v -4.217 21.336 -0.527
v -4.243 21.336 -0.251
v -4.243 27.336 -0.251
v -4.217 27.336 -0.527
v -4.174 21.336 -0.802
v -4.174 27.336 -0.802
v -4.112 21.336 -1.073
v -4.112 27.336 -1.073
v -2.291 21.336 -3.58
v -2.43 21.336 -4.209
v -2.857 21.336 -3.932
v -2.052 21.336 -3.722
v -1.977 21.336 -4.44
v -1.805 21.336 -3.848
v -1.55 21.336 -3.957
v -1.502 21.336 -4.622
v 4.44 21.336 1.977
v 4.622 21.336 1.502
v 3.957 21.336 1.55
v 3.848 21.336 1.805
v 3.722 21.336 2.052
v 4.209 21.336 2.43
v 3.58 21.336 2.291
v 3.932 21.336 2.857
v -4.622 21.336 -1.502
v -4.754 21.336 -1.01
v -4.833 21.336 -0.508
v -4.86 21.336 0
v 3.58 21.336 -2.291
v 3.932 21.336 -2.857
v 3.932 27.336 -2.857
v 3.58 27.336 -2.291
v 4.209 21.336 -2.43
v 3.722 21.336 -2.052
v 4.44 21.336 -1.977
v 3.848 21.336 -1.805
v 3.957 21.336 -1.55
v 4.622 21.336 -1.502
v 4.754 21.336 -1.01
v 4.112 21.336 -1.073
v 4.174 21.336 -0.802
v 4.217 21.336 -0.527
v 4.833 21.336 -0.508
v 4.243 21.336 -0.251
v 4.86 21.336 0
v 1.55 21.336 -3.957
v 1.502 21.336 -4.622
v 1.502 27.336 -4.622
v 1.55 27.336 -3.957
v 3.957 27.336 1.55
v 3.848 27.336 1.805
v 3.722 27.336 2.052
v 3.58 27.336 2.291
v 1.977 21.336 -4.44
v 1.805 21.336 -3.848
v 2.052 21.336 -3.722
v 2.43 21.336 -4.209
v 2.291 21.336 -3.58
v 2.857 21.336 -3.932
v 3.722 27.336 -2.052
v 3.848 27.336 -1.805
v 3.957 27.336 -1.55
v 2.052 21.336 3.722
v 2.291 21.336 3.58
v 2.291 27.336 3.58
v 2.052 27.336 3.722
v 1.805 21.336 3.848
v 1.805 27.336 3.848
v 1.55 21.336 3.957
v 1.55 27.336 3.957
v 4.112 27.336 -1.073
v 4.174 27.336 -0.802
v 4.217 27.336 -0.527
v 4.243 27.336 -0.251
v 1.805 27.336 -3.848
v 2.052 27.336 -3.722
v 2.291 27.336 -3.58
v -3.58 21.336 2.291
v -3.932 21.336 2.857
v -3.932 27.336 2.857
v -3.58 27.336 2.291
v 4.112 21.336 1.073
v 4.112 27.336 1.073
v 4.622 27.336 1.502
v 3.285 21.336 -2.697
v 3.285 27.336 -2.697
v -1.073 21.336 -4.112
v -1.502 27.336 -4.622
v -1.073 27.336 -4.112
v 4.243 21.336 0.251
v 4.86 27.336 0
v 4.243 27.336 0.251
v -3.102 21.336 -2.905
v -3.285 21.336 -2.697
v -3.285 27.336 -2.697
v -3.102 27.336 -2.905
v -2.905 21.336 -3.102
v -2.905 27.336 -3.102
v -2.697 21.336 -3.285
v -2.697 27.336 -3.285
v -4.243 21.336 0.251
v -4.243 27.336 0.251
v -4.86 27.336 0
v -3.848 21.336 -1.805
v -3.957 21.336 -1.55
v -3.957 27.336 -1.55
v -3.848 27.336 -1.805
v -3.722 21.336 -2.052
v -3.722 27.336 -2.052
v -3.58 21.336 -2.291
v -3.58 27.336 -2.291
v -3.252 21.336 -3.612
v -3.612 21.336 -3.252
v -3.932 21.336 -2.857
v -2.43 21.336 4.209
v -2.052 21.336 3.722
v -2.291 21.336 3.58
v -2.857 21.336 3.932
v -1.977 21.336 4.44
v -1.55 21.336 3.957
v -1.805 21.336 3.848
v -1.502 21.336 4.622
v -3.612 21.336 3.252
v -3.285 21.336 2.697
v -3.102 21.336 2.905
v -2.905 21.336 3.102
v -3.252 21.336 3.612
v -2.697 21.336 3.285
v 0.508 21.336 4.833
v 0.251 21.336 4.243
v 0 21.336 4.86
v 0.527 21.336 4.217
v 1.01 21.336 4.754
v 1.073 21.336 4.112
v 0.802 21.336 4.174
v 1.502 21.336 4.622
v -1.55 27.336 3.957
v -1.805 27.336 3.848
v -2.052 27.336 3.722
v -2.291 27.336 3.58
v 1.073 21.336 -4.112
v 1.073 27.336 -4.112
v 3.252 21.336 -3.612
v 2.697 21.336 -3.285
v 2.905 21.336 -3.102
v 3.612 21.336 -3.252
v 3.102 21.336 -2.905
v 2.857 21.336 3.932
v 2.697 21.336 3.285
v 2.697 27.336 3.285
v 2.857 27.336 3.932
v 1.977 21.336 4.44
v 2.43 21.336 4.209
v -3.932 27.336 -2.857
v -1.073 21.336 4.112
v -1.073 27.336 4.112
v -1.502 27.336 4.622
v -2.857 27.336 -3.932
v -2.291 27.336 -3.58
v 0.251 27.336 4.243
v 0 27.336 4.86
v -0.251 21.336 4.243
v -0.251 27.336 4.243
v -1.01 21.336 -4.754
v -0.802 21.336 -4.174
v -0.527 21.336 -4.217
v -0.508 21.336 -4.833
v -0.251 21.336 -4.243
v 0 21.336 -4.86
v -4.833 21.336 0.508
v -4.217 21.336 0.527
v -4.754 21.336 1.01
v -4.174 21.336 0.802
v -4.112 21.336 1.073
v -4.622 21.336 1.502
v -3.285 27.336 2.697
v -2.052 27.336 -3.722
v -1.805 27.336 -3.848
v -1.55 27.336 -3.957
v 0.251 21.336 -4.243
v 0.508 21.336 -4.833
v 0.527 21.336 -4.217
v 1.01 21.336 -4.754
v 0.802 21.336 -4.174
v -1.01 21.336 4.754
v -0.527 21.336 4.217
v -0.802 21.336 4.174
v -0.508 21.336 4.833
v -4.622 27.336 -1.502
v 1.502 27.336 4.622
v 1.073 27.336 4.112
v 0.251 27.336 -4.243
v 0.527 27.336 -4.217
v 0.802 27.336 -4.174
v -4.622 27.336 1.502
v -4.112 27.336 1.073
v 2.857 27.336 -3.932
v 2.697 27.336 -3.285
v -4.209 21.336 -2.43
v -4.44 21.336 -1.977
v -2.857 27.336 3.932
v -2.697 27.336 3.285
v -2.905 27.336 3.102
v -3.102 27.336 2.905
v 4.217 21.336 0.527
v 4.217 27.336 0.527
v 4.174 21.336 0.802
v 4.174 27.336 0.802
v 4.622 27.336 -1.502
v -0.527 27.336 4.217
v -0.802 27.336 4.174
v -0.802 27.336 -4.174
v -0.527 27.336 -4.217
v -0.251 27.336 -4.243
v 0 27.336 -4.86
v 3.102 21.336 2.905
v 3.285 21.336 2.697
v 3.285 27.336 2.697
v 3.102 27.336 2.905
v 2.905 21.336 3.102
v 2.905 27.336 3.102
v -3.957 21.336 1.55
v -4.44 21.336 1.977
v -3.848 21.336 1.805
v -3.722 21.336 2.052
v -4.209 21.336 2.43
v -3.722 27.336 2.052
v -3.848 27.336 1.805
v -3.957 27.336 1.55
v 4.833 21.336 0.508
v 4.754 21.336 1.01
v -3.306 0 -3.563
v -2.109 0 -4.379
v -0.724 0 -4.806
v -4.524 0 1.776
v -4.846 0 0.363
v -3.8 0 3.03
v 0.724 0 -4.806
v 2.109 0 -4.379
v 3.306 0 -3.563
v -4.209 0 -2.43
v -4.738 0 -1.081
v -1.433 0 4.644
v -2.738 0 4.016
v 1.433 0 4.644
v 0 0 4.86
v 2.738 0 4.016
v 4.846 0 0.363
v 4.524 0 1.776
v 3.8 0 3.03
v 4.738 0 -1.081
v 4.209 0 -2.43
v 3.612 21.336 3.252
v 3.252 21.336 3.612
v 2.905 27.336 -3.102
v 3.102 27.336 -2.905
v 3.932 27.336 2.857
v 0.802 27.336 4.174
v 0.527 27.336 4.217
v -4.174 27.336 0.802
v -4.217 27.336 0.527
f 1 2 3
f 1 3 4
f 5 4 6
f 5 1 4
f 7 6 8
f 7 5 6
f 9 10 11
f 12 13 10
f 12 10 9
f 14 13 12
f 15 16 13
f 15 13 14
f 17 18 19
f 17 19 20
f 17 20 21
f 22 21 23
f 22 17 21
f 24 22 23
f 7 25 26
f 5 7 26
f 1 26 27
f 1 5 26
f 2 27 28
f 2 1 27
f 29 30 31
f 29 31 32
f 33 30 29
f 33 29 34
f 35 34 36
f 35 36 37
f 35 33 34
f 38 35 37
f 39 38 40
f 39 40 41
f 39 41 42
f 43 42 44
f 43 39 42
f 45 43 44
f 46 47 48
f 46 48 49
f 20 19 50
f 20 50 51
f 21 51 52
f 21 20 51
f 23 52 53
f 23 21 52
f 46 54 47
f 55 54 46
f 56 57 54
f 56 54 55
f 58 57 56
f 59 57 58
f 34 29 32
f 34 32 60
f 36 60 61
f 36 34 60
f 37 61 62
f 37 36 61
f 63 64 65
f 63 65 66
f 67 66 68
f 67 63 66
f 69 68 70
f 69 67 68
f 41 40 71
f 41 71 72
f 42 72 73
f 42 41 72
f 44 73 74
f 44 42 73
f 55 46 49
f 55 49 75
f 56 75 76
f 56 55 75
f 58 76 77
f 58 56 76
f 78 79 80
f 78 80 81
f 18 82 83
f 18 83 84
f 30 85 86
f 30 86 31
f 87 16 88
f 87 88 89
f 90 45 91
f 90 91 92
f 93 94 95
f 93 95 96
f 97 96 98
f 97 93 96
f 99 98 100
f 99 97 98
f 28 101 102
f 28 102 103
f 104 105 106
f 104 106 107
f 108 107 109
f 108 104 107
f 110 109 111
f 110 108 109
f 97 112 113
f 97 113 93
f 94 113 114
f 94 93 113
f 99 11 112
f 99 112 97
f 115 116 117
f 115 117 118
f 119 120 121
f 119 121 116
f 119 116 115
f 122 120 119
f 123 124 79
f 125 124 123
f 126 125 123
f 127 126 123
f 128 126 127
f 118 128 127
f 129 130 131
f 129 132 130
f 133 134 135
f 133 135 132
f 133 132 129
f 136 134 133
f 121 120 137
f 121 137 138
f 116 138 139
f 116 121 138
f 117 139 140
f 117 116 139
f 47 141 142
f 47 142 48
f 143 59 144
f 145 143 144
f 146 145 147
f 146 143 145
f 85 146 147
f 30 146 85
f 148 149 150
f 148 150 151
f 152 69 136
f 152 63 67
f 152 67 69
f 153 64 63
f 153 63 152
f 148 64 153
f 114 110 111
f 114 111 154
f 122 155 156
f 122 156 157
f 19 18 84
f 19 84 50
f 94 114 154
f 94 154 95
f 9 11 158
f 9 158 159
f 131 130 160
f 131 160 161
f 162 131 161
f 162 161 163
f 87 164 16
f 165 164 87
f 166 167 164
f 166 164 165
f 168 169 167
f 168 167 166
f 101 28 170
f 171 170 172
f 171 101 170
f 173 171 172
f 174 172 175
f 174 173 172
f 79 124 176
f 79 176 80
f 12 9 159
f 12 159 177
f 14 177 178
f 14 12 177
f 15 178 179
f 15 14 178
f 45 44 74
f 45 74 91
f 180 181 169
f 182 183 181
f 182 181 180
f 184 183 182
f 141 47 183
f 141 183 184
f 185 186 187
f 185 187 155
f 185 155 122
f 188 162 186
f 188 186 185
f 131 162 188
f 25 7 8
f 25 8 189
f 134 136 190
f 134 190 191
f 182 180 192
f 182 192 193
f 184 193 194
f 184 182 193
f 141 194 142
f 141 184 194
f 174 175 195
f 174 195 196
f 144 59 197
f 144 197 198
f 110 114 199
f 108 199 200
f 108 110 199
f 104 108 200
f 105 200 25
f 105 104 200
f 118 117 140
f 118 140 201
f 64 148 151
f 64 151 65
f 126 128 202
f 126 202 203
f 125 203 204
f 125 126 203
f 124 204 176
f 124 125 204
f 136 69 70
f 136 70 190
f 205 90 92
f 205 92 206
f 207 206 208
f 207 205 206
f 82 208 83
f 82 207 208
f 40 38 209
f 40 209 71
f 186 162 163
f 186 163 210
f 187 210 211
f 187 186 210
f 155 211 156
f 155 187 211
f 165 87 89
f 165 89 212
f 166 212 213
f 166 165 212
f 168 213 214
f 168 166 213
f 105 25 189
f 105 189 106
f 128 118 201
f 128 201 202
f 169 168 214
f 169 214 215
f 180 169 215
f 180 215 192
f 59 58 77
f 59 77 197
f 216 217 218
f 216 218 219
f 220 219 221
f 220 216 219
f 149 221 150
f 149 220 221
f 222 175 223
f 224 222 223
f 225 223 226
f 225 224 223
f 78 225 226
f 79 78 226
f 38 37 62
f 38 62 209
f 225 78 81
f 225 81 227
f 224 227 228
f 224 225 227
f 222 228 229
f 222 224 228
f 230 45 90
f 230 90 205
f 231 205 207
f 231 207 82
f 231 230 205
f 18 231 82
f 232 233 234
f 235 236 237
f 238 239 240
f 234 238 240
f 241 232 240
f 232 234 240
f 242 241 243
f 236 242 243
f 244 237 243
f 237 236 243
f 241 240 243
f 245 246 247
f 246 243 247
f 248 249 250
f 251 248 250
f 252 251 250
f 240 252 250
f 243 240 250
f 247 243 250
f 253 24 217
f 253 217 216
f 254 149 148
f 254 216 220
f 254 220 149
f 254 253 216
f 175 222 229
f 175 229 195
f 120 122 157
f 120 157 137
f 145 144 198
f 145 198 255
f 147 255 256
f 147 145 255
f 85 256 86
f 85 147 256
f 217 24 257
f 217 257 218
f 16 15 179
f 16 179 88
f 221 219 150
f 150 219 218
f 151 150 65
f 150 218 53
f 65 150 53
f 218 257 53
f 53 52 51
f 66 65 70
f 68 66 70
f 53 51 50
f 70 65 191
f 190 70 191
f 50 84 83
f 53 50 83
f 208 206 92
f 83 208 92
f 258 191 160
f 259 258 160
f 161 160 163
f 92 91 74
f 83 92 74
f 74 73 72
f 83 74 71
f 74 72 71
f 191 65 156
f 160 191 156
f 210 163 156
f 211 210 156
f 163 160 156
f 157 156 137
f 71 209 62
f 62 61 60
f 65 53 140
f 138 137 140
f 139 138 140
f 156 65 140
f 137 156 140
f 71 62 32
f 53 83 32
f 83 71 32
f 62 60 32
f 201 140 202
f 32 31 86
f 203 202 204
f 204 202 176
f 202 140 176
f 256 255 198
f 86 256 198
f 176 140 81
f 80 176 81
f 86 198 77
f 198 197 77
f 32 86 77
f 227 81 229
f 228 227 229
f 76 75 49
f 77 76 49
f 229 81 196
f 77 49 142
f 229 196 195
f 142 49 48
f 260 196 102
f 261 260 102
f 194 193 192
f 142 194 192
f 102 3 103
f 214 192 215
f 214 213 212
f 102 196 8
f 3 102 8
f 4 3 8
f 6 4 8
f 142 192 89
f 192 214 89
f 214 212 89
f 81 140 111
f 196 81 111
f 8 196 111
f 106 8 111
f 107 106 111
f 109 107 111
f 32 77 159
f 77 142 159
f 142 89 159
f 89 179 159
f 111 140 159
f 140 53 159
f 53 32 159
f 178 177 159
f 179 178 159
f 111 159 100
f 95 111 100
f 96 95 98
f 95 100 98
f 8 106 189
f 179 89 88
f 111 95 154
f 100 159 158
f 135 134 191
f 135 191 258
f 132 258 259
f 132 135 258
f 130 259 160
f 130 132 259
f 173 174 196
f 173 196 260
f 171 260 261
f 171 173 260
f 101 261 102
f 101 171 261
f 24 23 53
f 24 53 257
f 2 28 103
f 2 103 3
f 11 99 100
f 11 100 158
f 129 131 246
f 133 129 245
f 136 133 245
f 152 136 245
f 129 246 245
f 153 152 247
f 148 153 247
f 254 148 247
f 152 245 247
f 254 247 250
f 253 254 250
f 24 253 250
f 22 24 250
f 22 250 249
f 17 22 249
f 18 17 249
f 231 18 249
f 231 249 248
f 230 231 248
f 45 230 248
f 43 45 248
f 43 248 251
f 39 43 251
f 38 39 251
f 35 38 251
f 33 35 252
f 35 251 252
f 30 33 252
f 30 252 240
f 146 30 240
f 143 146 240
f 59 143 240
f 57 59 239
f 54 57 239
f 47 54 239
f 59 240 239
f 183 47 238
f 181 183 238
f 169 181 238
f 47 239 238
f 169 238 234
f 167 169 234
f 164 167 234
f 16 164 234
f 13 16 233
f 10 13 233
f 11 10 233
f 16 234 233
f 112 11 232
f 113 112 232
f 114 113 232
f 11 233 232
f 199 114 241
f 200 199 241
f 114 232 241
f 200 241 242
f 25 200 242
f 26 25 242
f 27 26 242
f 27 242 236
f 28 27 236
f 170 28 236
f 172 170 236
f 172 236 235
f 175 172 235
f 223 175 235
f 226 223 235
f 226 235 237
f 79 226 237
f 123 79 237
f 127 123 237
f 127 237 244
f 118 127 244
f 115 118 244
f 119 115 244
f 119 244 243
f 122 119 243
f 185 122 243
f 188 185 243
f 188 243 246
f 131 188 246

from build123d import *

# Parameters (mm, degrees)
SKETCH1_R           = 4.86
BOSS_EXTRUDE1_DEPTH = 21.336
BOSS_EXTRUDE2_DEPTH = 6


with BuildPart() as part:
    # Sketch1 → Boss-Extrude1 (new body)
    with BuildSketch(Plane(origin=(0, 0, 0), x_dir=(1, 0, 0), z_dir=(0, 1, 0))):
        with Locations(Location((0, 0, 0), (0, 0, 270))):
            Circle(SKETCH1_R)
    extrude(amount=BOSS_EXTRUDE1_DEPTH)

    # Sketch2 → Boss-Extrude2 (add)
    with BuildSketch(Plane(origin=(0, 21.336, 0), x_dir=(1, 0, 0), z_dir=(0, 1, 0))):
        with BuildLine():
            Line((0, 4.86), (0.250754017, 4.242596189))
            ThreePointArc((0.250754017, 4.242596189), (0.664846476, 4.197675448), (1.072553081, 4.112436004))
            Line((1.072553081, 4.112436004), (1.501822593, 4.622134669))
            Line((1.501822593, 4.622134669), (1.549515564, 3.957461499))
            ThreePointArc((1.549515564, 3.957461499), (1.929459624, 3.786777728), (2.29087121, 3.57972193))
            Line((2.29087121, 3.57972193), (2.856636326, 3.931822593))
            Line((2.856636326, 3.931822593), (2.696599732, 3.284942904))
            ThreePointArc((2.696599732, 3.284942904), (3.00520382, 3.00520382), (3.284942904, 2.696599732))
            Line((3.284942904, 2.696599732), (3.931822593, 2.856636326))
            Line((3.931822593, 2.856636326), (3.57972193, 2.29087121))
            ThreePointArc((3.57972193, 2.29087121), (3.786777728, 1.929459624), (3.957461499, 1.549515564))
            Line((3.957461499, 1.549515564), (4.622134669, 1.501822593))
            Line((4.622134669, 1.501822593), (4.112436004, 1.072553081))
            ThreePointArc((4.112436004, 1.072553081), (4.197675448, 0.664846476), (4.242596189, 0.250754017))
            Line((4.242596189, 0.250754017), (4.86, 0))
            Line((4.86, 0), (4.242596189, -0.250754017))
            ThreePointArc((4.242596189, -0.250754017), (4.197675448, -0.664846476), (4.112436004, -1.072553081))
            Line((4.112436004, -1.072553081), (4.622134669, -1.501822593))
            Line((4.622134669, -1.501822593), (3.957461499, -1.549515564))
            ThreePointArc((3.957461499, -1.549515564), (3.786777728, -1.929459624), (3.57972193, -2.29087121))
            Line((3.57972193, -2.29087121), (3.931822593, -2.856636326))
            Line((3.931822593, -2.856636326), (3.284942904, -2.696599732))
            ThreePointArc((3.284942904, -2.696599732), (3.00520382, -3.00520382), (2.696599732, -3.284942904))
            Line((2.696599732, -3.284942904), (2.856636326, -3.931822593))
            Line((2.856636326, -3.931822593), (2.29087121, -3.57972193))
            ThreePointArc((2.29087121, -3.57972193), (1.929459624, -3.786777728), (1.549515564, -3.957461499))
            Line((1.549515564, -3.957461499), (1.501822593, -4.622134669))
            Line((1.501822593, -4.622134669), (1.072553081, -4.112436004))
            ThreePointArc((1.072553081, -4.112436004), (0.664846476, -4.197675448), (0.250754017, -4.242596189))
            Line((0.250754017, -4.242596189), (0, -4.86))
            Line((0, -4.86), (-0.250754017, -4.242596189))
            ThreePointArc((-0.250754017, -4.242596189), (-0.664846476, -4.197675448), (-1.072553081, -4.112436004))
            Line((-1.072553081, -4.112436004), (-1.501822593, -4.622134669))
            Line((-1.501822593, -4.622134669), (-1.549515564, -3.957461499))
            ThreePointArc((-1.549515564, -3.957461499), (-1.929459624, -3.786777728), (-2.29087121, -3.57972193))
            Line((-2.29087121, -3.57972193), (-2.856636326, -3.931822593))
            Line((-2.856636326, -3.931822593), (-2.696599732, -3.284942904))
            ThreePointArc((-2.696599732, -3.284942904), (-3.00520382, -3.00520382), (-3.284942904, -2.696599732))
            Line((-3.284942904, -2.696599732), (-3.931822593, -2.856636326))
            Line((-3.931822593, -2.856636326), (-3.57972193, -2.29087121))
            ThreePointArc((-3.57972193, -2.29087121), (-3.786777728, -1.929459624), (-3.957461499, -1.549515564))
            Line((-3.957461499, -1.549515564), (-4.622134669, -1.501822593))
            Line((-4.622134669, -1.501822593), (-4.112436004, -1.072553081))
            ThreePointArc((-4.112436004, -1.072553081), (-4.197675448, -0.664846476), (-4.242596189, -0.250754017))
            Line((-4.242596189, -0.250754017), (-4.86, 0))
            Line((-4.86, 0), (-4.242596189, 0.250754017))
            ThreePointArc((-4.242596189, 0.250754017), (-4.197675448, 0.664846476), (-4.112436004, 1.072553081))
            Line((-4.112436004, 1.072553081), (-4.622134669, 1.501822593))
            Line((-4.622134669, 1.501822593), (-3.957461499, 1.549515564))
            ThreePointArc((-3.957461499, 1.549515564), (-3.786777728, 1.929459624), (-3.57972193, 2.29087121))
            Line((-3.57972193, 2.29087121), (-3.931822593, 2.856636326))
            Line((-3.931822593, 2.856636326), (-3.284942904, 2.696599732))
            ThreePointArc((-3.284942904, 2.696599732), (-3.00520382, 3.00520382), (-2.696599732, 3.284942904))
            Line((-2.696599732, 3.284942904), (-2.856636326, 3.931822593))
            Line((-2.856636326, 3.931822593), (-2.29087121, 3.57972193))
            ThreePointArc((-2.29087121, 3.57972193), (-1.929459624, 3.786777728), (-1.549515564, 3.957461499))
            Line((-1.549515564, 3.957461499), (-1.501822593, 4.622134669))
            Line((-1.501822593, 4.622134669), (-1.072553081, 4.112436004))
            ThreePointArc((-1.072553081, 4.112436004), (-0.664846476, 4.197675448), (-0.250754017, 4.242596189))
            Line((-0.250754017, 4.242596189), (0, 4.86))
        make_face()
    extrude(amount=BOSS_EXTRUDE2_DEPTH)


solid = part.part
